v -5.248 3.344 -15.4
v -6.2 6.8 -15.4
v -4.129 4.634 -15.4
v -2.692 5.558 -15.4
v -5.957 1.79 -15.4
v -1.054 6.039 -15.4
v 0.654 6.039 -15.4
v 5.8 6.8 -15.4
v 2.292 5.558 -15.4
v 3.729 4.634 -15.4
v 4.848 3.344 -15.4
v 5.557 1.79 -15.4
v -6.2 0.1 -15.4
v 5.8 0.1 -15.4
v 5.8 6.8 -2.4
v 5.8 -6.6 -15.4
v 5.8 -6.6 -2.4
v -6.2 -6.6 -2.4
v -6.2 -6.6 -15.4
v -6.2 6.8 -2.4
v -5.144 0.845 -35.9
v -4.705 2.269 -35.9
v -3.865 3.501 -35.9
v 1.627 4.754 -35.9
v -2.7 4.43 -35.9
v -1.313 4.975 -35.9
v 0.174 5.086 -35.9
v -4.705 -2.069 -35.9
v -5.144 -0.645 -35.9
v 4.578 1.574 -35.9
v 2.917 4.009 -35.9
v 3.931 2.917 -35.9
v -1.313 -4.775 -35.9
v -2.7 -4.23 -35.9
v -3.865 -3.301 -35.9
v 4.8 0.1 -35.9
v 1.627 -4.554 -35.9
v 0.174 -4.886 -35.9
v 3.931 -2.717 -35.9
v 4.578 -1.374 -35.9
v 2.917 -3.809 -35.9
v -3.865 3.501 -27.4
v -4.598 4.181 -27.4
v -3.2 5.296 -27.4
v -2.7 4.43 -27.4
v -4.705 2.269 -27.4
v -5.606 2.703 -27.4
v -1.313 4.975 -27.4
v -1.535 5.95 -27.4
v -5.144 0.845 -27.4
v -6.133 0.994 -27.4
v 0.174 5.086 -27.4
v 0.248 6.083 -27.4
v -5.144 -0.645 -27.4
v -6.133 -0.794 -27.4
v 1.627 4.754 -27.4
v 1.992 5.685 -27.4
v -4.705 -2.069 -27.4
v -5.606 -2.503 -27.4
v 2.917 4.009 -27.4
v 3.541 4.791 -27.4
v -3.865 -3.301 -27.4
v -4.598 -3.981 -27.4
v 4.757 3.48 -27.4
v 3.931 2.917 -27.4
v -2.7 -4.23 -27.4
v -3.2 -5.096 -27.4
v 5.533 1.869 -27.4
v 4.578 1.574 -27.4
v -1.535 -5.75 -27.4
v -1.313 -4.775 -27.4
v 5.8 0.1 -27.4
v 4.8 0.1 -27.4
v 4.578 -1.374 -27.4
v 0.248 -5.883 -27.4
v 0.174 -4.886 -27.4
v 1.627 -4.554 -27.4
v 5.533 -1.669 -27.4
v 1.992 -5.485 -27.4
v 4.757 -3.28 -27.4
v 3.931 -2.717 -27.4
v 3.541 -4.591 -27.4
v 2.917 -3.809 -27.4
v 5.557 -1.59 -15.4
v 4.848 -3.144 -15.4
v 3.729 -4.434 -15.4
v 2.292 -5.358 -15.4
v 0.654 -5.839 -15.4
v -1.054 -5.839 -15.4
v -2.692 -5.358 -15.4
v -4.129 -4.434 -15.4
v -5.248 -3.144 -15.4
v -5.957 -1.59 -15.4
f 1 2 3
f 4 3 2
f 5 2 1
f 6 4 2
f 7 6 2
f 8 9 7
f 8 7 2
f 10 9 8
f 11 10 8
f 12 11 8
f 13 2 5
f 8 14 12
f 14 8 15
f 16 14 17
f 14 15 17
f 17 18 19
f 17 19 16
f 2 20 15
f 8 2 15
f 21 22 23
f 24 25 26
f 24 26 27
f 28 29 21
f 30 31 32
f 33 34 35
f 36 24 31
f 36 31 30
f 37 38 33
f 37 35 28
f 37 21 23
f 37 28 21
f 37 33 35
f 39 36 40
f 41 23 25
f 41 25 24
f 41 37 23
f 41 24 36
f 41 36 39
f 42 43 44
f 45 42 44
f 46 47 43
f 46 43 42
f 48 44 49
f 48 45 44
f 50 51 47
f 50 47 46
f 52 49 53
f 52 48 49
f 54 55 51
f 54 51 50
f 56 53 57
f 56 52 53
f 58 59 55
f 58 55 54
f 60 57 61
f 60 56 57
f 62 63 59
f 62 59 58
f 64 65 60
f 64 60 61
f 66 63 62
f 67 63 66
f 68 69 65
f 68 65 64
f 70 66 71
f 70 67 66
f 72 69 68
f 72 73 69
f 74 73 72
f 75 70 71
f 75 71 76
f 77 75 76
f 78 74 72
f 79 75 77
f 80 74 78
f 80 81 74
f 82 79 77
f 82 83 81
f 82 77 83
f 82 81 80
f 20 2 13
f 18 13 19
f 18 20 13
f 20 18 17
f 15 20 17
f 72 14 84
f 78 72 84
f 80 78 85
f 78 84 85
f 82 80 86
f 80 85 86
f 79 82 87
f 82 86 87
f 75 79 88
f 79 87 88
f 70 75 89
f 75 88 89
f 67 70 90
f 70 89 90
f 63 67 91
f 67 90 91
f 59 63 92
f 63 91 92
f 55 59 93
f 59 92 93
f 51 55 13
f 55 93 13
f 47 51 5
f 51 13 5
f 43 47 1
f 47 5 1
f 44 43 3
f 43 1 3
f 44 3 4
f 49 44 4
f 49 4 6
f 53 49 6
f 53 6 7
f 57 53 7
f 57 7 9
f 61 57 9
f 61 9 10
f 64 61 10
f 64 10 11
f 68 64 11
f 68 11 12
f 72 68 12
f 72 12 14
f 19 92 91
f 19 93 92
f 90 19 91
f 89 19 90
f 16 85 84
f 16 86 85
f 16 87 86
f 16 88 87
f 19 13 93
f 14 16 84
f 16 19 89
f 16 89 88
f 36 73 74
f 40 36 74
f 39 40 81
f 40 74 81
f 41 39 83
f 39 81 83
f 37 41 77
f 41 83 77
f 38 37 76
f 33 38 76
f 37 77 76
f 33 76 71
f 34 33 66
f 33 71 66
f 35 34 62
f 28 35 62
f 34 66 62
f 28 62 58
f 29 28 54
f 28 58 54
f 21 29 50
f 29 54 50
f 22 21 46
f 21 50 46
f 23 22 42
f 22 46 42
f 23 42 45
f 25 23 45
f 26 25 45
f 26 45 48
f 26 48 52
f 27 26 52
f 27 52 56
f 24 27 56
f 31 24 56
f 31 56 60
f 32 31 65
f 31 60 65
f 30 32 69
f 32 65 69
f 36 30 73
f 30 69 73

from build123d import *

# Parameters (mm, degrees)
SKETCH003_W             = 12
SKETCH003_H             = 13.4
PAD003_DEPTH            = 13
SKETCH004_R             = 6
PAD004_DEPTH            = 12
SKETCH005_R             = 5
PAD005_DEPTH            = 8.5
BODY002_PLACEMENT_ANGLE = 180


with BuildPart() as part:
    # Sketch003 → Pad003 (new body)
    with BuildSketch(Plane.XY):
        with Locations((6, 6.7)):
            Rectangle(SKETCH003_W, SKETCH003_H)
    extrude(amount=PAD003_DEPTH)

    # Sketch004 (on Face6 of Pad003) → Pad004 (join)
    with BuildSketch(Plane.XY.offset(13)):
        with Locations((6, 6.7)):
            Circle(SKETCH004_R)
    extrude(amount=PAD004_DEPTH)

    # Sketch005 (on Face9 of Pad004) → Pad005 (join)
    with BuildSketch(Plane.XY.offset(25)):
        with Locations((6, 6.7)):
            Circle(SKETCH005_R)
    extrude(amount=PAD005_DEPTH)


with BuildPart() as part_1:
    # Body002 placement: moved
    add(part.part.moved(Location((-6.2, 6.8, -2.4))).rotate(Axis((-6.2, 6.8, -2.4), (1, 0, 0)), BODY002_PLACEMENT_ANGLE))


solid = part_1.part
